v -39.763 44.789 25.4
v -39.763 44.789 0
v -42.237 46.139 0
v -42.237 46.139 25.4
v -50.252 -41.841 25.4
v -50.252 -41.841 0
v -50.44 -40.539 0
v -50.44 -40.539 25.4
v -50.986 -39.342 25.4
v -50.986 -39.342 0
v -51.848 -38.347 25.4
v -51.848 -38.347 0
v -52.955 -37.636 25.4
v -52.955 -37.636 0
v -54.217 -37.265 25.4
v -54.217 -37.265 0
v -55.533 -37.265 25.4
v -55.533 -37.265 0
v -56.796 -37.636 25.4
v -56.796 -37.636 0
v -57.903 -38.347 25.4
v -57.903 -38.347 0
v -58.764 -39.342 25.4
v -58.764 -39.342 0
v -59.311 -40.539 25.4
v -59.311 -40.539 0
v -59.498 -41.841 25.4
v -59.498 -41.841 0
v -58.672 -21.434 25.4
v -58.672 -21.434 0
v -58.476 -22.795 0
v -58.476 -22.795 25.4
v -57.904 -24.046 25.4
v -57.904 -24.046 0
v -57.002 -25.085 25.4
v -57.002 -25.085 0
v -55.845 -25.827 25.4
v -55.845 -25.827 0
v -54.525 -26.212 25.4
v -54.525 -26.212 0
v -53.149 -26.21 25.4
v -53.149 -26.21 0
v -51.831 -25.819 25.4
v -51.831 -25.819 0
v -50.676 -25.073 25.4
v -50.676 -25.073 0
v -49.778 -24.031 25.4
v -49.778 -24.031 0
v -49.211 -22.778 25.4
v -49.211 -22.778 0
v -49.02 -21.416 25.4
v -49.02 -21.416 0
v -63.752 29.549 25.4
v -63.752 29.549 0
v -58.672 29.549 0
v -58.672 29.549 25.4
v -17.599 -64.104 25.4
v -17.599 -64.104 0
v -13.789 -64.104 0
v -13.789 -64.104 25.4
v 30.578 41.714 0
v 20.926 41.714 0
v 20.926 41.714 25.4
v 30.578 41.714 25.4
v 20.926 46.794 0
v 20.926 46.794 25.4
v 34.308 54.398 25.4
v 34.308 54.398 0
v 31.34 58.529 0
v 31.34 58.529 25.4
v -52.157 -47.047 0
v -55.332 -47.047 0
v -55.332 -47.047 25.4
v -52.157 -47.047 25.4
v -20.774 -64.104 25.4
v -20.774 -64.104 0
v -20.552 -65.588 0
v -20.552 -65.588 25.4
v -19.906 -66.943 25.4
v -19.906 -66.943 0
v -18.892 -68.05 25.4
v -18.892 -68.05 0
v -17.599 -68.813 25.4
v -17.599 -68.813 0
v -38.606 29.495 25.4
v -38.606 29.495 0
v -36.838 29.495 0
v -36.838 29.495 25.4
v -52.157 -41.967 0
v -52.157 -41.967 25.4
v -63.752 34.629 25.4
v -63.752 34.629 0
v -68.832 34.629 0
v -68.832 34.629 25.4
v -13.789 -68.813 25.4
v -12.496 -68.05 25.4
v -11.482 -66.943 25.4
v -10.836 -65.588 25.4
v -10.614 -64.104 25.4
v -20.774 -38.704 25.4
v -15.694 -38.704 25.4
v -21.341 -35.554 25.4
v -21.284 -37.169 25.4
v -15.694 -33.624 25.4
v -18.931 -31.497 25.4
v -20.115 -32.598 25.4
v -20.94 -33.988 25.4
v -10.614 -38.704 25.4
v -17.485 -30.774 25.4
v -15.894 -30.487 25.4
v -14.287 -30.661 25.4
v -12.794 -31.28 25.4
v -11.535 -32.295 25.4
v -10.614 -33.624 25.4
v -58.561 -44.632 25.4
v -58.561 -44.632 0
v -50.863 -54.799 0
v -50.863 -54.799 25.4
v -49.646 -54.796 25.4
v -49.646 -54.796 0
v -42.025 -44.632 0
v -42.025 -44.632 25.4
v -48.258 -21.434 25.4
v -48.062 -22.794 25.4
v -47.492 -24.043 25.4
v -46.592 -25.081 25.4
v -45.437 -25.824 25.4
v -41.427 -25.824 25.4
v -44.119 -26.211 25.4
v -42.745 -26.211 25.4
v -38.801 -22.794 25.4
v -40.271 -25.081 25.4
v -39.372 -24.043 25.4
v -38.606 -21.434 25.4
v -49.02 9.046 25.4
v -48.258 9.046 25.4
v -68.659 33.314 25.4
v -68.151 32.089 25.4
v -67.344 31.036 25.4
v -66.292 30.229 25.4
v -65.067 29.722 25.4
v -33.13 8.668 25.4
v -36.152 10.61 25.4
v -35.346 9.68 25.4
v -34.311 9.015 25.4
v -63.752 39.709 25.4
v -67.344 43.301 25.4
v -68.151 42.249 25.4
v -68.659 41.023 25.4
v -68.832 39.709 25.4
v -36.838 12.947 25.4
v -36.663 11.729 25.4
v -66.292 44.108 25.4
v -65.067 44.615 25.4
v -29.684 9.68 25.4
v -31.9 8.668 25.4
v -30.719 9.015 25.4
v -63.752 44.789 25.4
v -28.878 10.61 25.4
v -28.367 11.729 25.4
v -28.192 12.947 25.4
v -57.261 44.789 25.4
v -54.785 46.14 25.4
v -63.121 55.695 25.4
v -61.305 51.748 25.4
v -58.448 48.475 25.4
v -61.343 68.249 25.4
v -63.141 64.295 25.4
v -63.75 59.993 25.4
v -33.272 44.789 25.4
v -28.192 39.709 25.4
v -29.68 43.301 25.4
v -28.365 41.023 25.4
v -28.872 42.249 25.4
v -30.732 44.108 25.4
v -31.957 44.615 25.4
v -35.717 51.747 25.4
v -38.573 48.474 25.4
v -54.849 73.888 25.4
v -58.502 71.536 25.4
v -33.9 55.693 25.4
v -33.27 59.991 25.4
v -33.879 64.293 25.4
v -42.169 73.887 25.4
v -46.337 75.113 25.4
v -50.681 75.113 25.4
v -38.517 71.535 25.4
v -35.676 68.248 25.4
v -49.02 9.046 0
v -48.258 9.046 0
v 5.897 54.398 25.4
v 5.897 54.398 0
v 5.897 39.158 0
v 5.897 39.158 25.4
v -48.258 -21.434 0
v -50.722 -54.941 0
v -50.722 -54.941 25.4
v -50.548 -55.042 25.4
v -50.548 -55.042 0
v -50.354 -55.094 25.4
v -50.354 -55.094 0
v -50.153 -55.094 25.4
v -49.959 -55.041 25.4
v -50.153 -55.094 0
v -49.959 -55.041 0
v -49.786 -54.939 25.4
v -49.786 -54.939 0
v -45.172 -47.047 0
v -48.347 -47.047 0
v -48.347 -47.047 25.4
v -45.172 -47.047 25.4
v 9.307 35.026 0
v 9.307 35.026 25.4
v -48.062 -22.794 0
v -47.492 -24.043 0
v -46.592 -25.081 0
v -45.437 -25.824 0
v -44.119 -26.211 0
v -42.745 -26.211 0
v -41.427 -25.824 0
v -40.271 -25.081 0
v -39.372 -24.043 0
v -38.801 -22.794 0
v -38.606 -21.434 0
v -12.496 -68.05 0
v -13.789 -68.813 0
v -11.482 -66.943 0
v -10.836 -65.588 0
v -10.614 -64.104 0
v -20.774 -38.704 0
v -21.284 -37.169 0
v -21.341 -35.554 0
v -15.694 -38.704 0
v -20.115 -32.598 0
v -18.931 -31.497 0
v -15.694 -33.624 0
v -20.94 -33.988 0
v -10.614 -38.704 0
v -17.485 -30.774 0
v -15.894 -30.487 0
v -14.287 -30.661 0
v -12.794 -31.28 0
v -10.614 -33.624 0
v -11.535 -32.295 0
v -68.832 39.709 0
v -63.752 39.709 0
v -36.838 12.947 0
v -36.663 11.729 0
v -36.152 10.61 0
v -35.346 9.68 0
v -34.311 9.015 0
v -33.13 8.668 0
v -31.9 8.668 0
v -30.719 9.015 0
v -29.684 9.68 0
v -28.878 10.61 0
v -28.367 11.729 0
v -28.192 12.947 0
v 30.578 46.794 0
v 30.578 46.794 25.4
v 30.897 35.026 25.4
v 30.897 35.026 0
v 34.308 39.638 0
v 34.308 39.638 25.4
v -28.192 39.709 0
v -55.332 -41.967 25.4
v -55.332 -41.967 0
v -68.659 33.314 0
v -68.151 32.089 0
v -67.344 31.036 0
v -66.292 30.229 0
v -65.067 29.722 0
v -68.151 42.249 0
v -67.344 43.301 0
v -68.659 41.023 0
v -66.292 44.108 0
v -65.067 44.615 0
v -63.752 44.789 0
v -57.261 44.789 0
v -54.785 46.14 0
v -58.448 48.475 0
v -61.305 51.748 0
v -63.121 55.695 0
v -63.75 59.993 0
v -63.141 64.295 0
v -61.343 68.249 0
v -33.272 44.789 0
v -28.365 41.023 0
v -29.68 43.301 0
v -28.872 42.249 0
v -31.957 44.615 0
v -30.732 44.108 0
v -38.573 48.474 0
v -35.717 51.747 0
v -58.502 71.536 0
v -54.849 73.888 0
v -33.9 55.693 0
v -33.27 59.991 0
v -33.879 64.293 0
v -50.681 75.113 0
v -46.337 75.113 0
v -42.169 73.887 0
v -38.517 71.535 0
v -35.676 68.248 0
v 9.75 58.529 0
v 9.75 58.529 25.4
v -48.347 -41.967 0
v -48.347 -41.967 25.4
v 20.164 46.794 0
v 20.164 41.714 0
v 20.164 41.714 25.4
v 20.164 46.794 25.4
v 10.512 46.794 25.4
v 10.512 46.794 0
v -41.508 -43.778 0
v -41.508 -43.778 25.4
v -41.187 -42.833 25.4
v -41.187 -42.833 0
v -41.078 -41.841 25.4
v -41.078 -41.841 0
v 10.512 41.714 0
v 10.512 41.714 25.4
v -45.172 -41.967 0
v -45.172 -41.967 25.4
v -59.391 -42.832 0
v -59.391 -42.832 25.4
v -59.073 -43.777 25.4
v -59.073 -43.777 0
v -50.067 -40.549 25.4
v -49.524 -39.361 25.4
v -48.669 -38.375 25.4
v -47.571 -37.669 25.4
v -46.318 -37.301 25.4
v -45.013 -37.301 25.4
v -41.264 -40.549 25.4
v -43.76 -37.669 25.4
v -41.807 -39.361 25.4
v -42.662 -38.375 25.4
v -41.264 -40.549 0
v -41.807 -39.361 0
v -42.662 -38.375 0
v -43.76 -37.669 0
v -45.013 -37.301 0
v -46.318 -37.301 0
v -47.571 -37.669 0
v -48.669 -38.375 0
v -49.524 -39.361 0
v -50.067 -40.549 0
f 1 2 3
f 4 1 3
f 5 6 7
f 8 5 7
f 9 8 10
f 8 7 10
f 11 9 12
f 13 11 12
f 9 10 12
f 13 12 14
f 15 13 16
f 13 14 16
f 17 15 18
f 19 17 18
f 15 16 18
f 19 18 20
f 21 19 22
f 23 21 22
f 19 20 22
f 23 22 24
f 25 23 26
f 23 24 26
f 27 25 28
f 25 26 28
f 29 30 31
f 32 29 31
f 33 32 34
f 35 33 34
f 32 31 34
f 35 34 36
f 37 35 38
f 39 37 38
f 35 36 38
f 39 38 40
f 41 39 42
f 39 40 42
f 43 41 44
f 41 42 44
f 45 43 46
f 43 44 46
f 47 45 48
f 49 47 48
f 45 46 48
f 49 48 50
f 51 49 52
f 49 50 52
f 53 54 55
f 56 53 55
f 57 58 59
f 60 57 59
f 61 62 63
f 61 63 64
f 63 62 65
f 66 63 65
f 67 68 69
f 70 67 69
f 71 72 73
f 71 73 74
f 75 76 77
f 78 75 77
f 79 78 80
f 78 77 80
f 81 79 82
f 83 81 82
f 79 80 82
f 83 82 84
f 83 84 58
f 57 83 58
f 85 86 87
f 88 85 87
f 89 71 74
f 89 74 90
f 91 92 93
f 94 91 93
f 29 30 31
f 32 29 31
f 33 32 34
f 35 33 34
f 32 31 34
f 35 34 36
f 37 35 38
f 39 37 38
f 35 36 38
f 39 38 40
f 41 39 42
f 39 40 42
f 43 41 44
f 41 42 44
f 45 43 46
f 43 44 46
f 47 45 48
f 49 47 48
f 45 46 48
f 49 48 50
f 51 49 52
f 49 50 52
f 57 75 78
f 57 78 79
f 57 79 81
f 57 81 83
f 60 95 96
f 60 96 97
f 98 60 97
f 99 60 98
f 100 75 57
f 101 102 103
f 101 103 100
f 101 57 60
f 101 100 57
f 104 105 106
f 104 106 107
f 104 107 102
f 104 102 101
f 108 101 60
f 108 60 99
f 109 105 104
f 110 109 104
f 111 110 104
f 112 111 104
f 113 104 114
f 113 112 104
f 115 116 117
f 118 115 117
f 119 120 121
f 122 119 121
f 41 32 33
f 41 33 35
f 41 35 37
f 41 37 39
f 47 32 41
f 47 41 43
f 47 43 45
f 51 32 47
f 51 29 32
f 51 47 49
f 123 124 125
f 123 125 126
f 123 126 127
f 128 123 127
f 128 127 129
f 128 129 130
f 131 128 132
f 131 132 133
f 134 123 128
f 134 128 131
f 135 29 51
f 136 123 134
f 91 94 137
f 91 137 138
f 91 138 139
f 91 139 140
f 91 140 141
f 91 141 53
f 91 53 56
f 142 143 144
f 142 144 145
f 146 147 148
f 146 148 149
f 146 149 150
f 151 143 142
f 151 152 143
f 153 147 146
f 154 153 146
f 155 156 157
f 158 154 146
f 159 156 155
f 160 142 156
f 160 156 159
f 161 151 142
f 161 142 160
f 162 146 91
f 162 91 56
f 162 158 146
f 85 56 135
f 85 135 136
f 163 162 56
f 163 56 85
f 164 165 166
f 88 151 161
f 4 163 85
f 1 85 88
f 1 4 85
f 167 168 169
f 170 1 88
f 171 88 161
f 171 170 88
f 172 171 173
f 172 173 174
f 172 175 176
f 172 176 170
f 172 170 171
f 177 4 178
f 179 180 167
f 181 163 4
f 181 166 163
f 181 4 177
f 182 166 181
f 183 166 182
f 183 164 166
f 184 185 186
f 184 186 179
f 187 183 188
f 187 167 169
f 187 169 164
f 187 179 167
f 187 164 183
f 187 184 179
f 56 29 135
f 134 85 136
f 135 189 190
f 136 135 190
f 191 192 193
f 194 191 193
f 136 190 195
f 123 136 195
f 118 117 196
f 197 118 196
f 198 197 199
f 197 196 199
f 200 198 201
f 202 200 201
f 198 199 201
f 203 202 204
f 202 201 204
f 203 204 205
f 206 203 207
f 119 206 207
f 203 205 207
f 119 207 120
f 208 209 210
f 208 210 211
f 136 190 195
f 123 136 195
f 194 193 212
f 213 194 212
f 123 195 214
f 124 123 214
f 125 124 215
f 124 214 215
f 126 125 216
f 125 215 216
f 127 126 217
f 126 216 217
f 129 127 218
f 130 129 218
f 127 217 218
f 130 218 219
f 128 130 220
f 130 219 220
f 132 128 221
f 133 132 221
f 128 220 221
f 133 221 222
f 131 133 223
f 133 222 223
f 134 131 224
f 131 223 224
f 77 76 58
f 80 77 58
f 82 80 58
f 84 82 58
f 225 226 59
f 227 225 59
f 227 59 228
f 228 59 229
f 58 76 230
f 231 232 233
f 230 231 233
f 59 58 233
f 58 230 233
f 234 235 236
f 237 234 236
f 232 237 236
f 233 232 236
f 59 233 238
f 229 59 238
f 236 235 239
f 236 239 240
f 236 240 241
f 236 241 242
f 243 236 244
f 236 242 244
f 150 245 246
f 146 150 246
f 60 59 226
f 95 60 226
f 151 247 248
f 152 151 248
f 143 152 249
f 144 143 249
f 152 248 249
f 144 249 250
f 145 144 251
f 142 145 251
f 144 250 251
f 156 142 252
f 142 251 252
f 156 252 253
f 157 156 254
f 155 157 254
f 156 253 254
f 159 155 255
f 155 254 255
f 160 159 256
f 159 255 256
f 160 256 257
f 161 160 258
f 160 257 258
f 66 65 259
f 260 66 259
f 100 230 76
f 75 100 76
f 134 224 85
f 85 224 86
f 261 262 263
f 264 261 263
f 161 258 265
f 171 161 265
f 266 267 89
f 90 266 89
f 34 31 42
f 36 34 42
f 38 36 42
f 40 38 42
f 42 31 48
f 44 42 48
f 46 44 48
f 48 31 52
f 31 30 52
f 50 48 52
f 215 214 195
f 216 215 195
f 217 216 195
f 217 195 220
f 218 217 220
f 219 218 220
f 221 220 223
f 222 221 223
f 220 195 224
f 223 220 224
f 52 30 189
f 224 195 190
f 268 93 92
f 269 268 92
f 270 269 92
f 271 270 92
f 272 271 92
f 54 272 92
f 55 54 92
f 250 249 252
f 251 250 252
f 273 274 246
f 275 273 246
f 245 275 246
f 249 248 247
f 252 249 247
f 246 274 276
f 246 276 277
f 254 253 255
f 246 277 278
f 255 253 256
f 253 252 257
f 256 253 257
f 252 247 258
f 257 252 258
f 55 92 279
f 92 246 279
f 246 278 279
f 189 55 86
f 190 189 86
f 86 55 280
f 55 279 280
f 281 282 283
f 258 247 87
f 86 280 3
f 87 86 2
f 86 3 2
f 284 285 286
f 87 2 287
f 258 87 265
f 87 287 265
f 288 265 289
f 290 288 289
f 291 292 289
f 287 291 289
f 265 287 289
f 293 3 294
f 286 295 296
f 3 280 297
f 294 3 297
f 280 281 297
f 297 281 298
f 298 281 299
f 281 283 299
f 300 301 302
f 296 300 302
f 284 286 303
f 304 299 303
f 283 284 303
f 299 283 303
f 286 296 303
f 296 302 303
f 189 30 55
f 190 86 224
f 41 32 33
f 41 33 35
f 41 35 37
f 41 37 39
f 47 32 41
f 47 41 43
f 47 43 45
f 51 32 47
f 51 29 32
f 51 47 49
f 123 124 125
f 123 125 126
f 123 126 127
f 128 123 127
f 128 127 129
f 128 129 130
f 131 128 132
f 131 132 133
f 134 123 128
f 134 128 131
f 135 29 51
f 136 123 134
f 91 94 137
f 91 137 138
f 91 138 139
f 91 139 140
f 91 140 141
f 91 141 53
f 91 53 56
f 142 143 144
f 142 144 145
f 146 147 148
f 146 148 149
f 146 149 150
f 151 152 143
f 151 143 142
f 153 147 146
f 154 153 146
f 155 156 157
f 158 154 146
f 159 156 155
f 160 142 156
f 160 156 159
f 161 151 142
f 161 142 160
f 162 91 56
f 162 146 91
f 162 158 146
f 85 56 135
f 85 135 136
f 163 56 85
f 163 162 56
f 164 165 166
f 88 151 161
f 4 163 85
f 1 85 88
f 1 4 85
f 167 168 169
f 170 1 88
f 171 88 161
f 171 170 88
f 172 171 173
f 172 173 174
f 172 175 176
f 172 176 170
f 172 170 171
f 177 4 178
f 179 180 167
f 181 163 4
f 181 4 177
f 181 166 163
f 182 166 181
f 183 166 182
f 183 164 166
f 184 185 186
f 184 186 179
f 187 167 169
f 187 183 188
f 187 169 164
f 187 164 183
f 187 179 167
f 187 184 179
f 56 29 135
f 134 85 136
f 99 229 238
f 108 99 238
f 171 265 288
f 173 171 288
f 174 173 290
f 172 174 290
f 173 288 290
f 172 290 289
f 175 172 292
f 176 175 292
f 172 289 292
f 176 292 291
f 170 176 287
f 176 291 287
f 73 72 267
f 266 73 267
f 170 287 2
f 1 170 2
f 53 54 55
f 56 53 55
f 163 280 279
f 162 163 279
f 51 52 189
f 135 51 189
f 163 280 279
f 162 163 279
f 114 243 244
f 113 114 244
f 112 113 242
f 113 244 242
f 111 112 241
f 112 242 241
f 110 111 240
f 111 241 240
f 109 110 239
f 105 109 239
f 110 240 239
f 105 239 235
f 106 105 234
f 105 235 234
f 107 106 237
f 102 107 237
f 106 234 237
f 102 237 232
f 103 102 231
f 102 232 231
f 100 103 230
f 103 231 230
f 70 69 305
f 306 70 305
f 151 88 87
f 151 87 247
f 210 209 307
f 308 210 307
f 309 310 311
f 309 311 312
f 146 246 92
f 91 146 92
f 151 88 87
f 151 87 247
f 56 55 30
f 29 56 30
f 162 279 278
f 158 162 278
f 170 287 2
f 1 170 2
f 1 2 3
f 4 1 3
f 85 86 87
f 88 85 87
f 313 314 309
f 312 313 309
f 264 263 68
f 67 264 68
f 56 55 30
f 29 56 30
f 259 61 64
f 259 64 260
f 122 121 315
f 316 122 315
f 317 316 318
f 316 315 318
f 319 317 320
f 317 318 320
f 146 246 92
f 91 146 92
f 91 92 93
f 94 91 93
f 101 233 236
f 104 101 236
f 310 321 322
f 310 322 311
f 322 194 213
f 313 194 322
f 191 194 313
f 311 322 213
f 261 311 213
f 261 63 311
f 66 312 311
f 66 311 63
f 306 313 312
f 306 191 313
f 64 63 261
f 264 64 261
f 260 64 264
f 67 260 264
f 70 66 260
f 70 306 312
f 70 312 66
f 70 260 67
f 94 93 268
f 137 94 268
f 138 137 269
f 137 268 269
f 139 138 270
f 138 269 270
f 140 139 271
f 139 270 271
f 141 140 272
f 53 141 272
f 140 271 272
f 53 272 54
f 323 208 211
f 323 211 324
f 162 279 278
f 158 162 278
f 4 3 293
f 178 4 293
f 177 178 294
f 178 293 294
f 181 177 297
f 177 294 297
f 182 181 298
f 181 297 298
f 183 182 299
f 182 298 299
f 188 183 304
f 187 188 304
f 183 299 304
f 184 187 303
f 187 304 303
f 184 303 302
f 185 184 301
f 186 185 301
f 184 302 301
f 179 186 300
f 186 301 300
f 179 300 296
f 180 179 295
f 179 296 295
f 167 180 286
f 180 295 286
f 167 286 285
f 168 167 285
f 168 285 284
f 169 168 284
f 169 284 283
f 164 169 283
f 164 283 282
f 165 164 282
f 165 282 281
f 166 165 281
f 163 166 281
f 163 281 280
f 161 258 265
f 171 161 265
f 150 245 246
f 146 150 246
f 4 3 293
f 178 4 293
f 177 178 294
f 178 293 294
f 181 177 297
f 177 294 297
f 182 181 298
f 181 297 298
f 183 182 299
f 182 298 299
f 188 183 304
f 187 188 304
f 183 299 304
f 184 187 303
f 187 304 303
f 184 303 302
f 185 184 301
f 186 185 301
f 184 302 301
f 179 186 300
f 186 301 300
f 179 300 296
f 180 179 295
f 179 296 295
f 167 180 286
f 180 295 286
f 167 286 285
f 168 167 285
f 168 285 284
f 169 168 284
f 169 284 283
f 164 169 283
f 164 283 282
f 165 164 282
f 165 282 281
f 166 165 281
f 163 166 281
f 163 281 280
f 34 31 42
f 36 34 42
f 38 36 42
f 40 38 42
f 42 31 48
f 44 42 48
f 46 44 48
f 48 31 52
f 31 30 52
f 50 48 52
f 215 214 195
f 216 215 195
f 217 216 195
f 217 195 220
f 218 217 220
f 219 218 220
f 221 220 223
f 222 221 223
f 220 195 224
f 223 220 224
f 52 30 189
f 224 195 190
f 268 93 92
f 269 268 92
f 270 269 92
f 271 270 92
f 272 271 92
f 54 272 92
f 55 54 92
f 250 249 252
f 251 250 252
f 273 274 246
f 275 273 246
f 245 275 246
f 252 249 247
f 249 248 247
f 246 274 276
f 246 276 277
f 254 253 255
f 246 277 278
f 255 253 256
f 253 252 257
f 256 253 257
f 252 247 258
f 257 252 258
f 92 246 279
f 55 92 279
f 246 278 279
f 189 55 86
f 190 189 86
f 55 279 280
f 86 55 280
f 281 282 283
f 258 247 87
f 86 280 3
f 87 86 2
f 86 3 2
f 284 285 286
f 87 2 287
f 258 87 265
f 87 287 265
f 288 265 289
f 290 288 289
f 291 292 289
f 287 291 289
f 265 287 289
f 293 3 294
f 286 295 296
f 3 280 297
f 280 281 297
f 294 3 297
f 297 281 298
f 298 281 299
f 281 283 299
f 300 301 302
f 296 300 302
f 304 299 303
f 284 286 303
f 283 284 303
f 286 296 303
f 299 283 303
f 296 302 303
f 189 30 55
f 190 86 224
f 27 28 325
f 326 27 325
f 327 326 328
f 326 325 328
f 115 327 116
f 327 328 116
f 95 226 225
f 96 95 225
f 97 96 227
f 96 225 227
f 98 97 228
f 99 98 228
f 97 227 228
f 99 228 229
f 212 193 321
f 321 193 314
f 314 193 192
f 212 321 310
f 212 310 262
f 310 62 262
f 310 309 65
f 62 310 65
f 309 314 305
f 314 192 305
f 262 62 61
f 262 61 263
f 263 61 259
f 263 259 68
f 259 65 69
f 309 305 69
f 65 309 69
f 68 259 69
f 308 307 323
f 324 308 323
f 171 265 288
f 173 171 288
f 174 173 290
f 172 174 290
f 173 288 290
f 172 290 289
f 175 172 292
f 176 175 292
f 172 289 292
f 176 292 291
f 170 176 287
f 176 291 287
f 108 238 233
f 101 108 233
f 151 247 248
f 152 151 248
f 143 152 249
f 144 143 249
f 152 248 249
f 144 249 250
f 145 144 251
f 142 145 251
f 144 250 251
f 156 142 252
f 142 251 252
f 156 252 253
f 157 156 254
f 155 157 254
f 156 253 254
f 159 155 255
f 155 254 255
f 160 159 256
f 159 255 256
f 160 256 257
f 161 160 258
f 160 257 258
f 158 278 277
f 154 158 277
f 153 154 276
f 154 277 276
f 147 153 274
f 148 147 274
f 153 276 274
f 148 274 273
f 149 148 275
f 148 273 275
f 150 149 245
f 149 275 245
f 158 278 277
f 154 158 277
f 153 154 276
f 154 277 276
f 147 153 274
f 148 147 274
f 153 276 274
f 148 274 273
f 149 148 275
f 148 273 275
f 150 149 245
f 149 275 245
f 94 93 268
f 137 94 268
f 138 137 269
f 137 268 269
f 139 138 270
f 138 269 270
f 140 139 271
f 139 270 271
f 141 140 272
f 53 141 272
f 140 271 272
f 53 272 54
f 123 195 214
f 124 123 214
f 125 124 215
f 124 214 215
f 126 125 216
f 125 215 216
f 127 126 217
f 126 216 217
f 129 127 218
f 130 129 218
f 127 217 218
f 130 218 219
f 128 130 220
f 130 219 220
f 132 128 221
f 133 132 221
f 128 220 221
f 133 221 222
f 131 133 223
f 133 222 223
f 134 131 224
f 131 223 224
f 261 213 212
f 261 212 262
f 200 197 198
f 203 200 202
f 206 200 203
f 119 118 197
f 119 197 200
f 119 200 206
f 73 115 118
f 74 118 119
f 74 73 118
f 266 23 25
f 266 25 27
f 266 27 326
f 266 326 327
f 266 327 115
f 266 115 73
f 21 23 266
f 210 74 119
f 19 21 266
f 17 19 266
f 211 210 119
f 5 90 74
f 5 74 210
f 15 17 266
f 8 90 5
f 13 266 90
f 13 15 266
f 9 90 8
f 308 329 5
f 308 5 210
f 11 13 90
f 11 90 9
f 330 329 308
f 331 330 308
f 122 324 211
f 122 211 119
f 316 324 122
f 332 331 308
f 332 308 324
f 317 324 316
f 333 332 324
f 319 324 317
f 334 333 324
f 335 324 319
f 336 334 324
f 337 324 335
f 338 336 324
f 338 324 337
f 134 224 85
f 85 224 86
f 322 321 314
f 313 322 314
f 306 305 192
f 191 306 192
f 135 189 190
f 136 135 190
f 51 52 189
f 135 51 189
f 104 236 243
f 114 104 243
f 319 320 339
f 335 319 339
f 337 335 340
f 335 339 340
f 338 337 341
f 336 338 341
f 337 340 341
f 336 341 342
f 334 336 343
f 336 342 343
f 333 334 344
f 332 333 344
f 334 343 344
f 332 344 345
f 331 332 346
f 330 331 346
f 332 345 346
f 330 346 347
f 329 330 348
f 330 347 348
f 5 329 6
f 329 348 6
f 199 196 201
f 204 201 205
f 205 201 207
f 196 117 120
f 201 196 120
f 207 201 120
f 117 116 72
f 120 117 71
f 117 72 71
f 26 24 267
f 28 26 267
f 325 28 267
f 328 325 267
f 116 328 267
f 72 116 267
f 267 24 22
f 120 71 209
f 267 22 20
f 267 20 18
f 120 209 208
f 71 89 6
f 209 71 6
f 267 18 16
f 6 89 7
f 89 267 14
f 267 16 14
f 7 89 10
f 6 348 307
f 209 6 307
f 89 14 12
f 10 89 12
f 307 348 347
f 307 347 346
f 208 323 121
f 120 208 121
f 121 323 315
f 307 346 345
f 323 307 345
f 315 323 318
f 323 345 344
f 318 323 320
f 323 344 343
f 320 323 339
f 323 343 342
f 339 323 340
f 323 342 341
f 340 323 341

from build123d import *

# Parameters (mm, degrees)
F3_DEPTH = 25.4
F0_W     = 9.652
F0_H     = 5.08
F1_W     = 3.175
F1_H     = 5.08


with BuildPart() as f3:
    # F0 (on Top) → F3 (new body)
    with BuildSketch(Plane.XY):
        with BuildLine():
            Line((-28.1917748163, 12.9473765527), (-28.1917748163, 39.7085584502))
            ThreePointArc((-28.1917748163, 39.7085584502), (-29.6796723678, 43.3006608987), (-33.2717748163, 44.7885584502))
            Line((-33.2717748163, 44.7885584502), (-39.762626545, 44.7885584502))
            Line((-39.762626545, 44.7885584502), (-42.2371126216, 46.139429306))
            ThreePointArc((-42.2371126216, 46.139429306), (-48.509008117, 75.2685585129), (-54.7848715272, 46.1402839345))
            Line((-54.7848715272, 46.1402839345), (-57.2609230876, 44.7885584502))
            Line((-57.2609230876, 44.7885584502), (-63.7517748163, 44.7885584502))
            ThreePointArc((-63.7517748163, 44.7885584502), (-67.3438772647, 43.3006608987), (-68.8317748163, 39.7085584502))
            Line((-68.8317748163, 39.7085584502), (-63.7517748163, 39.7085584502))
            Line((-63.7517748163, 39.7085584502), (-63.7517748163, 34.6285584502))
            Line((-63.7517748163, 34.6285584502), (-68.8317748163, 34.6285584502))
            ThreePointArc((-68.8317748163, 34.6285584502), (-67.3438772647, 31.0364560018), (-63.7517748163, 29.5485584502))
            Line((-63.7517748163, 29.5485584502), (-58.6717748163, 29.5485584502))
            Line((-58.6717748163, 29.5485584502), (-58.6717748163, -21.4341506362))
            ThreePointArc((-58.6717748163, -21.4341506362), (-53.8369461328, -26.2601425606), (-49.0198071187, -21.4164932988))
            Line((-49.0198071187, -21.4164932988), (-49.0198071187, 9.0458493638))
            Line((-49.0198071187, 9.0458493638), (-48.2577748163, 9.0458493638))
            Line((-48.2577748163, 9.0458493638), (-48.2577748163, -21.4341506362))
            ThreePointArc((-48.2577748163, -21.4341506362), (-43.4317748163, -26.2601506362), (-38.6057748163, -21.4341506362))
            Line((-38.6057748163, -21.4341506362), (-38.6057748163, 12.9473765527))
            Line((-38.6057748163, 12.9473765527), (-38.6057748163, 29.4945929002))
            Line((-38.6057748163, 29.4945929002), (-36.8378617594, 29.4945929002))
            Line((-36.8378617594, 29.4945929002), (-36.8378617594, 12.9473765527))
            ThreePointArc((-36.8378617594, 12.9473765527), (-32.5148182878, 8.6243330811), (-28.1917748163, 12.9473765527))
        make_face()
    extrude(amount=F3_DEPTH)


with BuildPart() as f3b:
    # F0 (on Top) → F3, piece 2 (new body)
    with BuildSketch(Plane.XY):
        with BuildLine():
            Line((-15.6940906626, -33.6235351861), (-10.6140906626, -33.6235351861))
            ThreePointArc((-10.6140906626, -33.6235351861), (-18.2340906626, -31.0835351861), (-20.7740906626, -38.7035351861))
            Line((-20.7740906626, -38.7035351861), (-20.7740906626, -64.1035351861))
            ThreePointArc((-20.7740906626, -64.1035351861), (-19.9062041463, -66.9433415175), (-17.5990906626, -68.8128212254))
            Line((-17.5990906626, -68.8128212254), (-17.5990906626, -64.1035351861))
            Line((-17.5990906626, -64.1035351861), (-15.6940906626, -64.1035351861))
            Line((-15.6940906626, -64.1035351861), (-13.7890906626, -64.1035351861))
            Line((-13.7890906626, -64.1035351861), (-13.7890906626, -68.8128212254))
            ThreePointArc((-13.7890906626, -68.8128212254), (-11.4819771788, -66.9433415175), (-10.6140906626, -64.1035351861))
            Line((-10.6140906626, -64.1035351861), (-10.6140906626, -38.7035351861))
            Line((-10.6140906626, -38.7035351861), (-15.6940906626, -38.7035351861))
            Line((-15.6940906626, -38.7035351861), (-15.6940906626, -33.6235351861))
        make_face()
    extrude(amount=F3_DEPTH)


with BuildPart() as f3c:
    # F0 (on Top) → F3, piece 3 (new body)
    with BuildSketch(Plane.XY):
        Polygon((30.8973955526, 35.0257876711), (34.307523109, 39.6376268461), (34.307523109, 49.1508445693), (34.307523109, 54.3975071411), (31.3398899744, 58.5292266111), (13.4937340529, 58.5292266111), (9.7498899744, 58.5292266111), (5.8972679963, 54.3975071411), (5.8972679963, 49.1707248643), (5.8972679963, 48.6707248643), (5.8972679963, 39.1575071411), (9.3073955526, 35.0257876711), (13.6428794689, 35.0257876711), (14.216993131, 35.0257876711), align=None)
        with Locations((15.3378899744, 44.2537332261)):
            Rectangle(F0_W, F0_H, mode=Mode.SUBTRACT)
        with Locations((25.7518899744, 44.2537332261)):
            Rectangle(F0_W, F0_H, mode=Mode.SUBTRACT)
    extrude(amount=F3_DEPTH)


with BuildPart() as f3d:
    # F2 (on face) → F3, piece 4 (new body)
    with BuildSketch(Plane.XY):
        with BuildLine():
            ThreePointArc((-36.8378617594, 12.9473765527), (-32.5148182878, 8.6243330811), (-28.1917748163, 12.9473765527))
            Line((-28.1917748163, 12.9473765527), (-28.1917748163, 39.7085584502))
            ThreePointArc((-28.1917748163, 39.7085584502), (-29.6796723678, 43.3006608987), (-33.2717748163, 44.7885584502))
            Line((-33.2717748163, 44.7885584502), (-39.762626545, 44.7885584502))
            Line((-39.762626545, 44.7885584502), (-42.2371126216, 46.139429306))
            ThreePointArc((-42.2371126216, 46.139429306), (-48.509008117, 75.2685585129), (-54.7848715272, 46.1402839345))
            Line((-54.7848715272, 46.1402839345), (-57.2609230876, 44.7885584502))
            Line((-57.2609230876, 44.7885584502), (-63.7517748163, 44.7885584502))
            ThreePointArc((-63.7517748163, 44.7885584502), (-67.3438772647, 43.3006608987), (-68.8317748163, 39.7085584502))
            Line((-68.8317748163, 39.7085584502), (-63.7517748163, 39.7085584502))
            Line((-63.7517748163, 39.7085584502), (-63.7517748163, 34.6285584502))
            Line((-63.7517748163, 34.6285584502), (-68.8317748163, 34.6285584502))
            ThreePointArc((-68.8317748163, 34.6285584502), (-67.3438772647, 31.0364560018), (-63.7517748163, 29.5485584502))
            Line((-63.7517748163, 29.5485584502), (-58.6717748163, 29.5485584502))
            Line((-58.6717748163, 29.5485584502), (-58.6717748163, -21.4341506362))
            ThreePointArc((-58.6717748163, -21.4341506362), (-53.8369461328, -26.2601425606), (-49.0198071187, -21.4164932988))
            Line((-49.0198071187, -21.4164932988), (-49.0198071187, 9.0458493638))
            Line((-49.0198071187, 9.0458493638), (-48.2577748163, 9.0458493638))
            Line((-48.2577748163, 9.0458493638), (-48.2577748163, -21.4341506362))
            ThreePointArc((-48.2577748163, -21.4341506362), (-43.4317748163, -26.2601506362), (-38.6057748163, -21.4341506362))
            Line((-38.6057748163, -21.4341506362), (-38.6057748163, 12.9473765527))
            Line((-38.6057748163, 12.9473765527), (-38.6057748163, 29.4945929002))
            Line((-38.6057748163, 29.4945929002), (-36.8378617594, 29.4945929002))
            Line((-36.8378617594, 29.4945929002), (-36.8378617594, 12.9473765527))
        make_face()
    extrude(amount=F3_DEPTH)


with BuildPart() as f3e:
    # F1 (on Top) → F3, piece 5 (new body)
    with BuildSketch(Plane.XY):
        with BuildLine():
            ThreePointArc((-50.252426967, -41.8411232531), (-54.875226967, -37.2183232531), (-59.498026967, -41.8411232531))
            ThreePointArc((-59.498026967, -41.8411232531), (-59.2574612316, -43.3129597558), (-58.5608016099, -44.6316105568))
            Line((-58.5608016099, -44.6316105568), (-50.8629144293, -54.7987013579))
            ThreePointArc((-50.8629144293, -54.7987013579), (-50.2536117915, -55.10072882), (-49.6457351157, -54.7958415631))
            Line((-49.6457351157, -54.7958415631), (-42.0248895306, -44.6316105568))
            ThreePointArc((-42.0248895306, -44.6316105568), (-41.3215032913, -43.3144321396), (-41.0784557462, -41.8411232531))
            ThreePointArc((-41.0784557462, -41.8411232531), (-45.6654413566, -37.2541376427), (-50.252426967, -41.8411232531))
        make_face()
        with Locations((-53.744926967, -44.5068070035)):
            Rectangle(F1_W, F1_H, mode=Mode.SUBTRACT)
        with Locations((-46.759926967, -44.5068070035)):
            Rectangle(F1_W, F1_H, mode=Mode.SUBTRACT)
    extrude(amount=F3_DEPTH)


solid = Compound([f3.part, f3b.part, f3c.part, f3d.part, f3e.part])
